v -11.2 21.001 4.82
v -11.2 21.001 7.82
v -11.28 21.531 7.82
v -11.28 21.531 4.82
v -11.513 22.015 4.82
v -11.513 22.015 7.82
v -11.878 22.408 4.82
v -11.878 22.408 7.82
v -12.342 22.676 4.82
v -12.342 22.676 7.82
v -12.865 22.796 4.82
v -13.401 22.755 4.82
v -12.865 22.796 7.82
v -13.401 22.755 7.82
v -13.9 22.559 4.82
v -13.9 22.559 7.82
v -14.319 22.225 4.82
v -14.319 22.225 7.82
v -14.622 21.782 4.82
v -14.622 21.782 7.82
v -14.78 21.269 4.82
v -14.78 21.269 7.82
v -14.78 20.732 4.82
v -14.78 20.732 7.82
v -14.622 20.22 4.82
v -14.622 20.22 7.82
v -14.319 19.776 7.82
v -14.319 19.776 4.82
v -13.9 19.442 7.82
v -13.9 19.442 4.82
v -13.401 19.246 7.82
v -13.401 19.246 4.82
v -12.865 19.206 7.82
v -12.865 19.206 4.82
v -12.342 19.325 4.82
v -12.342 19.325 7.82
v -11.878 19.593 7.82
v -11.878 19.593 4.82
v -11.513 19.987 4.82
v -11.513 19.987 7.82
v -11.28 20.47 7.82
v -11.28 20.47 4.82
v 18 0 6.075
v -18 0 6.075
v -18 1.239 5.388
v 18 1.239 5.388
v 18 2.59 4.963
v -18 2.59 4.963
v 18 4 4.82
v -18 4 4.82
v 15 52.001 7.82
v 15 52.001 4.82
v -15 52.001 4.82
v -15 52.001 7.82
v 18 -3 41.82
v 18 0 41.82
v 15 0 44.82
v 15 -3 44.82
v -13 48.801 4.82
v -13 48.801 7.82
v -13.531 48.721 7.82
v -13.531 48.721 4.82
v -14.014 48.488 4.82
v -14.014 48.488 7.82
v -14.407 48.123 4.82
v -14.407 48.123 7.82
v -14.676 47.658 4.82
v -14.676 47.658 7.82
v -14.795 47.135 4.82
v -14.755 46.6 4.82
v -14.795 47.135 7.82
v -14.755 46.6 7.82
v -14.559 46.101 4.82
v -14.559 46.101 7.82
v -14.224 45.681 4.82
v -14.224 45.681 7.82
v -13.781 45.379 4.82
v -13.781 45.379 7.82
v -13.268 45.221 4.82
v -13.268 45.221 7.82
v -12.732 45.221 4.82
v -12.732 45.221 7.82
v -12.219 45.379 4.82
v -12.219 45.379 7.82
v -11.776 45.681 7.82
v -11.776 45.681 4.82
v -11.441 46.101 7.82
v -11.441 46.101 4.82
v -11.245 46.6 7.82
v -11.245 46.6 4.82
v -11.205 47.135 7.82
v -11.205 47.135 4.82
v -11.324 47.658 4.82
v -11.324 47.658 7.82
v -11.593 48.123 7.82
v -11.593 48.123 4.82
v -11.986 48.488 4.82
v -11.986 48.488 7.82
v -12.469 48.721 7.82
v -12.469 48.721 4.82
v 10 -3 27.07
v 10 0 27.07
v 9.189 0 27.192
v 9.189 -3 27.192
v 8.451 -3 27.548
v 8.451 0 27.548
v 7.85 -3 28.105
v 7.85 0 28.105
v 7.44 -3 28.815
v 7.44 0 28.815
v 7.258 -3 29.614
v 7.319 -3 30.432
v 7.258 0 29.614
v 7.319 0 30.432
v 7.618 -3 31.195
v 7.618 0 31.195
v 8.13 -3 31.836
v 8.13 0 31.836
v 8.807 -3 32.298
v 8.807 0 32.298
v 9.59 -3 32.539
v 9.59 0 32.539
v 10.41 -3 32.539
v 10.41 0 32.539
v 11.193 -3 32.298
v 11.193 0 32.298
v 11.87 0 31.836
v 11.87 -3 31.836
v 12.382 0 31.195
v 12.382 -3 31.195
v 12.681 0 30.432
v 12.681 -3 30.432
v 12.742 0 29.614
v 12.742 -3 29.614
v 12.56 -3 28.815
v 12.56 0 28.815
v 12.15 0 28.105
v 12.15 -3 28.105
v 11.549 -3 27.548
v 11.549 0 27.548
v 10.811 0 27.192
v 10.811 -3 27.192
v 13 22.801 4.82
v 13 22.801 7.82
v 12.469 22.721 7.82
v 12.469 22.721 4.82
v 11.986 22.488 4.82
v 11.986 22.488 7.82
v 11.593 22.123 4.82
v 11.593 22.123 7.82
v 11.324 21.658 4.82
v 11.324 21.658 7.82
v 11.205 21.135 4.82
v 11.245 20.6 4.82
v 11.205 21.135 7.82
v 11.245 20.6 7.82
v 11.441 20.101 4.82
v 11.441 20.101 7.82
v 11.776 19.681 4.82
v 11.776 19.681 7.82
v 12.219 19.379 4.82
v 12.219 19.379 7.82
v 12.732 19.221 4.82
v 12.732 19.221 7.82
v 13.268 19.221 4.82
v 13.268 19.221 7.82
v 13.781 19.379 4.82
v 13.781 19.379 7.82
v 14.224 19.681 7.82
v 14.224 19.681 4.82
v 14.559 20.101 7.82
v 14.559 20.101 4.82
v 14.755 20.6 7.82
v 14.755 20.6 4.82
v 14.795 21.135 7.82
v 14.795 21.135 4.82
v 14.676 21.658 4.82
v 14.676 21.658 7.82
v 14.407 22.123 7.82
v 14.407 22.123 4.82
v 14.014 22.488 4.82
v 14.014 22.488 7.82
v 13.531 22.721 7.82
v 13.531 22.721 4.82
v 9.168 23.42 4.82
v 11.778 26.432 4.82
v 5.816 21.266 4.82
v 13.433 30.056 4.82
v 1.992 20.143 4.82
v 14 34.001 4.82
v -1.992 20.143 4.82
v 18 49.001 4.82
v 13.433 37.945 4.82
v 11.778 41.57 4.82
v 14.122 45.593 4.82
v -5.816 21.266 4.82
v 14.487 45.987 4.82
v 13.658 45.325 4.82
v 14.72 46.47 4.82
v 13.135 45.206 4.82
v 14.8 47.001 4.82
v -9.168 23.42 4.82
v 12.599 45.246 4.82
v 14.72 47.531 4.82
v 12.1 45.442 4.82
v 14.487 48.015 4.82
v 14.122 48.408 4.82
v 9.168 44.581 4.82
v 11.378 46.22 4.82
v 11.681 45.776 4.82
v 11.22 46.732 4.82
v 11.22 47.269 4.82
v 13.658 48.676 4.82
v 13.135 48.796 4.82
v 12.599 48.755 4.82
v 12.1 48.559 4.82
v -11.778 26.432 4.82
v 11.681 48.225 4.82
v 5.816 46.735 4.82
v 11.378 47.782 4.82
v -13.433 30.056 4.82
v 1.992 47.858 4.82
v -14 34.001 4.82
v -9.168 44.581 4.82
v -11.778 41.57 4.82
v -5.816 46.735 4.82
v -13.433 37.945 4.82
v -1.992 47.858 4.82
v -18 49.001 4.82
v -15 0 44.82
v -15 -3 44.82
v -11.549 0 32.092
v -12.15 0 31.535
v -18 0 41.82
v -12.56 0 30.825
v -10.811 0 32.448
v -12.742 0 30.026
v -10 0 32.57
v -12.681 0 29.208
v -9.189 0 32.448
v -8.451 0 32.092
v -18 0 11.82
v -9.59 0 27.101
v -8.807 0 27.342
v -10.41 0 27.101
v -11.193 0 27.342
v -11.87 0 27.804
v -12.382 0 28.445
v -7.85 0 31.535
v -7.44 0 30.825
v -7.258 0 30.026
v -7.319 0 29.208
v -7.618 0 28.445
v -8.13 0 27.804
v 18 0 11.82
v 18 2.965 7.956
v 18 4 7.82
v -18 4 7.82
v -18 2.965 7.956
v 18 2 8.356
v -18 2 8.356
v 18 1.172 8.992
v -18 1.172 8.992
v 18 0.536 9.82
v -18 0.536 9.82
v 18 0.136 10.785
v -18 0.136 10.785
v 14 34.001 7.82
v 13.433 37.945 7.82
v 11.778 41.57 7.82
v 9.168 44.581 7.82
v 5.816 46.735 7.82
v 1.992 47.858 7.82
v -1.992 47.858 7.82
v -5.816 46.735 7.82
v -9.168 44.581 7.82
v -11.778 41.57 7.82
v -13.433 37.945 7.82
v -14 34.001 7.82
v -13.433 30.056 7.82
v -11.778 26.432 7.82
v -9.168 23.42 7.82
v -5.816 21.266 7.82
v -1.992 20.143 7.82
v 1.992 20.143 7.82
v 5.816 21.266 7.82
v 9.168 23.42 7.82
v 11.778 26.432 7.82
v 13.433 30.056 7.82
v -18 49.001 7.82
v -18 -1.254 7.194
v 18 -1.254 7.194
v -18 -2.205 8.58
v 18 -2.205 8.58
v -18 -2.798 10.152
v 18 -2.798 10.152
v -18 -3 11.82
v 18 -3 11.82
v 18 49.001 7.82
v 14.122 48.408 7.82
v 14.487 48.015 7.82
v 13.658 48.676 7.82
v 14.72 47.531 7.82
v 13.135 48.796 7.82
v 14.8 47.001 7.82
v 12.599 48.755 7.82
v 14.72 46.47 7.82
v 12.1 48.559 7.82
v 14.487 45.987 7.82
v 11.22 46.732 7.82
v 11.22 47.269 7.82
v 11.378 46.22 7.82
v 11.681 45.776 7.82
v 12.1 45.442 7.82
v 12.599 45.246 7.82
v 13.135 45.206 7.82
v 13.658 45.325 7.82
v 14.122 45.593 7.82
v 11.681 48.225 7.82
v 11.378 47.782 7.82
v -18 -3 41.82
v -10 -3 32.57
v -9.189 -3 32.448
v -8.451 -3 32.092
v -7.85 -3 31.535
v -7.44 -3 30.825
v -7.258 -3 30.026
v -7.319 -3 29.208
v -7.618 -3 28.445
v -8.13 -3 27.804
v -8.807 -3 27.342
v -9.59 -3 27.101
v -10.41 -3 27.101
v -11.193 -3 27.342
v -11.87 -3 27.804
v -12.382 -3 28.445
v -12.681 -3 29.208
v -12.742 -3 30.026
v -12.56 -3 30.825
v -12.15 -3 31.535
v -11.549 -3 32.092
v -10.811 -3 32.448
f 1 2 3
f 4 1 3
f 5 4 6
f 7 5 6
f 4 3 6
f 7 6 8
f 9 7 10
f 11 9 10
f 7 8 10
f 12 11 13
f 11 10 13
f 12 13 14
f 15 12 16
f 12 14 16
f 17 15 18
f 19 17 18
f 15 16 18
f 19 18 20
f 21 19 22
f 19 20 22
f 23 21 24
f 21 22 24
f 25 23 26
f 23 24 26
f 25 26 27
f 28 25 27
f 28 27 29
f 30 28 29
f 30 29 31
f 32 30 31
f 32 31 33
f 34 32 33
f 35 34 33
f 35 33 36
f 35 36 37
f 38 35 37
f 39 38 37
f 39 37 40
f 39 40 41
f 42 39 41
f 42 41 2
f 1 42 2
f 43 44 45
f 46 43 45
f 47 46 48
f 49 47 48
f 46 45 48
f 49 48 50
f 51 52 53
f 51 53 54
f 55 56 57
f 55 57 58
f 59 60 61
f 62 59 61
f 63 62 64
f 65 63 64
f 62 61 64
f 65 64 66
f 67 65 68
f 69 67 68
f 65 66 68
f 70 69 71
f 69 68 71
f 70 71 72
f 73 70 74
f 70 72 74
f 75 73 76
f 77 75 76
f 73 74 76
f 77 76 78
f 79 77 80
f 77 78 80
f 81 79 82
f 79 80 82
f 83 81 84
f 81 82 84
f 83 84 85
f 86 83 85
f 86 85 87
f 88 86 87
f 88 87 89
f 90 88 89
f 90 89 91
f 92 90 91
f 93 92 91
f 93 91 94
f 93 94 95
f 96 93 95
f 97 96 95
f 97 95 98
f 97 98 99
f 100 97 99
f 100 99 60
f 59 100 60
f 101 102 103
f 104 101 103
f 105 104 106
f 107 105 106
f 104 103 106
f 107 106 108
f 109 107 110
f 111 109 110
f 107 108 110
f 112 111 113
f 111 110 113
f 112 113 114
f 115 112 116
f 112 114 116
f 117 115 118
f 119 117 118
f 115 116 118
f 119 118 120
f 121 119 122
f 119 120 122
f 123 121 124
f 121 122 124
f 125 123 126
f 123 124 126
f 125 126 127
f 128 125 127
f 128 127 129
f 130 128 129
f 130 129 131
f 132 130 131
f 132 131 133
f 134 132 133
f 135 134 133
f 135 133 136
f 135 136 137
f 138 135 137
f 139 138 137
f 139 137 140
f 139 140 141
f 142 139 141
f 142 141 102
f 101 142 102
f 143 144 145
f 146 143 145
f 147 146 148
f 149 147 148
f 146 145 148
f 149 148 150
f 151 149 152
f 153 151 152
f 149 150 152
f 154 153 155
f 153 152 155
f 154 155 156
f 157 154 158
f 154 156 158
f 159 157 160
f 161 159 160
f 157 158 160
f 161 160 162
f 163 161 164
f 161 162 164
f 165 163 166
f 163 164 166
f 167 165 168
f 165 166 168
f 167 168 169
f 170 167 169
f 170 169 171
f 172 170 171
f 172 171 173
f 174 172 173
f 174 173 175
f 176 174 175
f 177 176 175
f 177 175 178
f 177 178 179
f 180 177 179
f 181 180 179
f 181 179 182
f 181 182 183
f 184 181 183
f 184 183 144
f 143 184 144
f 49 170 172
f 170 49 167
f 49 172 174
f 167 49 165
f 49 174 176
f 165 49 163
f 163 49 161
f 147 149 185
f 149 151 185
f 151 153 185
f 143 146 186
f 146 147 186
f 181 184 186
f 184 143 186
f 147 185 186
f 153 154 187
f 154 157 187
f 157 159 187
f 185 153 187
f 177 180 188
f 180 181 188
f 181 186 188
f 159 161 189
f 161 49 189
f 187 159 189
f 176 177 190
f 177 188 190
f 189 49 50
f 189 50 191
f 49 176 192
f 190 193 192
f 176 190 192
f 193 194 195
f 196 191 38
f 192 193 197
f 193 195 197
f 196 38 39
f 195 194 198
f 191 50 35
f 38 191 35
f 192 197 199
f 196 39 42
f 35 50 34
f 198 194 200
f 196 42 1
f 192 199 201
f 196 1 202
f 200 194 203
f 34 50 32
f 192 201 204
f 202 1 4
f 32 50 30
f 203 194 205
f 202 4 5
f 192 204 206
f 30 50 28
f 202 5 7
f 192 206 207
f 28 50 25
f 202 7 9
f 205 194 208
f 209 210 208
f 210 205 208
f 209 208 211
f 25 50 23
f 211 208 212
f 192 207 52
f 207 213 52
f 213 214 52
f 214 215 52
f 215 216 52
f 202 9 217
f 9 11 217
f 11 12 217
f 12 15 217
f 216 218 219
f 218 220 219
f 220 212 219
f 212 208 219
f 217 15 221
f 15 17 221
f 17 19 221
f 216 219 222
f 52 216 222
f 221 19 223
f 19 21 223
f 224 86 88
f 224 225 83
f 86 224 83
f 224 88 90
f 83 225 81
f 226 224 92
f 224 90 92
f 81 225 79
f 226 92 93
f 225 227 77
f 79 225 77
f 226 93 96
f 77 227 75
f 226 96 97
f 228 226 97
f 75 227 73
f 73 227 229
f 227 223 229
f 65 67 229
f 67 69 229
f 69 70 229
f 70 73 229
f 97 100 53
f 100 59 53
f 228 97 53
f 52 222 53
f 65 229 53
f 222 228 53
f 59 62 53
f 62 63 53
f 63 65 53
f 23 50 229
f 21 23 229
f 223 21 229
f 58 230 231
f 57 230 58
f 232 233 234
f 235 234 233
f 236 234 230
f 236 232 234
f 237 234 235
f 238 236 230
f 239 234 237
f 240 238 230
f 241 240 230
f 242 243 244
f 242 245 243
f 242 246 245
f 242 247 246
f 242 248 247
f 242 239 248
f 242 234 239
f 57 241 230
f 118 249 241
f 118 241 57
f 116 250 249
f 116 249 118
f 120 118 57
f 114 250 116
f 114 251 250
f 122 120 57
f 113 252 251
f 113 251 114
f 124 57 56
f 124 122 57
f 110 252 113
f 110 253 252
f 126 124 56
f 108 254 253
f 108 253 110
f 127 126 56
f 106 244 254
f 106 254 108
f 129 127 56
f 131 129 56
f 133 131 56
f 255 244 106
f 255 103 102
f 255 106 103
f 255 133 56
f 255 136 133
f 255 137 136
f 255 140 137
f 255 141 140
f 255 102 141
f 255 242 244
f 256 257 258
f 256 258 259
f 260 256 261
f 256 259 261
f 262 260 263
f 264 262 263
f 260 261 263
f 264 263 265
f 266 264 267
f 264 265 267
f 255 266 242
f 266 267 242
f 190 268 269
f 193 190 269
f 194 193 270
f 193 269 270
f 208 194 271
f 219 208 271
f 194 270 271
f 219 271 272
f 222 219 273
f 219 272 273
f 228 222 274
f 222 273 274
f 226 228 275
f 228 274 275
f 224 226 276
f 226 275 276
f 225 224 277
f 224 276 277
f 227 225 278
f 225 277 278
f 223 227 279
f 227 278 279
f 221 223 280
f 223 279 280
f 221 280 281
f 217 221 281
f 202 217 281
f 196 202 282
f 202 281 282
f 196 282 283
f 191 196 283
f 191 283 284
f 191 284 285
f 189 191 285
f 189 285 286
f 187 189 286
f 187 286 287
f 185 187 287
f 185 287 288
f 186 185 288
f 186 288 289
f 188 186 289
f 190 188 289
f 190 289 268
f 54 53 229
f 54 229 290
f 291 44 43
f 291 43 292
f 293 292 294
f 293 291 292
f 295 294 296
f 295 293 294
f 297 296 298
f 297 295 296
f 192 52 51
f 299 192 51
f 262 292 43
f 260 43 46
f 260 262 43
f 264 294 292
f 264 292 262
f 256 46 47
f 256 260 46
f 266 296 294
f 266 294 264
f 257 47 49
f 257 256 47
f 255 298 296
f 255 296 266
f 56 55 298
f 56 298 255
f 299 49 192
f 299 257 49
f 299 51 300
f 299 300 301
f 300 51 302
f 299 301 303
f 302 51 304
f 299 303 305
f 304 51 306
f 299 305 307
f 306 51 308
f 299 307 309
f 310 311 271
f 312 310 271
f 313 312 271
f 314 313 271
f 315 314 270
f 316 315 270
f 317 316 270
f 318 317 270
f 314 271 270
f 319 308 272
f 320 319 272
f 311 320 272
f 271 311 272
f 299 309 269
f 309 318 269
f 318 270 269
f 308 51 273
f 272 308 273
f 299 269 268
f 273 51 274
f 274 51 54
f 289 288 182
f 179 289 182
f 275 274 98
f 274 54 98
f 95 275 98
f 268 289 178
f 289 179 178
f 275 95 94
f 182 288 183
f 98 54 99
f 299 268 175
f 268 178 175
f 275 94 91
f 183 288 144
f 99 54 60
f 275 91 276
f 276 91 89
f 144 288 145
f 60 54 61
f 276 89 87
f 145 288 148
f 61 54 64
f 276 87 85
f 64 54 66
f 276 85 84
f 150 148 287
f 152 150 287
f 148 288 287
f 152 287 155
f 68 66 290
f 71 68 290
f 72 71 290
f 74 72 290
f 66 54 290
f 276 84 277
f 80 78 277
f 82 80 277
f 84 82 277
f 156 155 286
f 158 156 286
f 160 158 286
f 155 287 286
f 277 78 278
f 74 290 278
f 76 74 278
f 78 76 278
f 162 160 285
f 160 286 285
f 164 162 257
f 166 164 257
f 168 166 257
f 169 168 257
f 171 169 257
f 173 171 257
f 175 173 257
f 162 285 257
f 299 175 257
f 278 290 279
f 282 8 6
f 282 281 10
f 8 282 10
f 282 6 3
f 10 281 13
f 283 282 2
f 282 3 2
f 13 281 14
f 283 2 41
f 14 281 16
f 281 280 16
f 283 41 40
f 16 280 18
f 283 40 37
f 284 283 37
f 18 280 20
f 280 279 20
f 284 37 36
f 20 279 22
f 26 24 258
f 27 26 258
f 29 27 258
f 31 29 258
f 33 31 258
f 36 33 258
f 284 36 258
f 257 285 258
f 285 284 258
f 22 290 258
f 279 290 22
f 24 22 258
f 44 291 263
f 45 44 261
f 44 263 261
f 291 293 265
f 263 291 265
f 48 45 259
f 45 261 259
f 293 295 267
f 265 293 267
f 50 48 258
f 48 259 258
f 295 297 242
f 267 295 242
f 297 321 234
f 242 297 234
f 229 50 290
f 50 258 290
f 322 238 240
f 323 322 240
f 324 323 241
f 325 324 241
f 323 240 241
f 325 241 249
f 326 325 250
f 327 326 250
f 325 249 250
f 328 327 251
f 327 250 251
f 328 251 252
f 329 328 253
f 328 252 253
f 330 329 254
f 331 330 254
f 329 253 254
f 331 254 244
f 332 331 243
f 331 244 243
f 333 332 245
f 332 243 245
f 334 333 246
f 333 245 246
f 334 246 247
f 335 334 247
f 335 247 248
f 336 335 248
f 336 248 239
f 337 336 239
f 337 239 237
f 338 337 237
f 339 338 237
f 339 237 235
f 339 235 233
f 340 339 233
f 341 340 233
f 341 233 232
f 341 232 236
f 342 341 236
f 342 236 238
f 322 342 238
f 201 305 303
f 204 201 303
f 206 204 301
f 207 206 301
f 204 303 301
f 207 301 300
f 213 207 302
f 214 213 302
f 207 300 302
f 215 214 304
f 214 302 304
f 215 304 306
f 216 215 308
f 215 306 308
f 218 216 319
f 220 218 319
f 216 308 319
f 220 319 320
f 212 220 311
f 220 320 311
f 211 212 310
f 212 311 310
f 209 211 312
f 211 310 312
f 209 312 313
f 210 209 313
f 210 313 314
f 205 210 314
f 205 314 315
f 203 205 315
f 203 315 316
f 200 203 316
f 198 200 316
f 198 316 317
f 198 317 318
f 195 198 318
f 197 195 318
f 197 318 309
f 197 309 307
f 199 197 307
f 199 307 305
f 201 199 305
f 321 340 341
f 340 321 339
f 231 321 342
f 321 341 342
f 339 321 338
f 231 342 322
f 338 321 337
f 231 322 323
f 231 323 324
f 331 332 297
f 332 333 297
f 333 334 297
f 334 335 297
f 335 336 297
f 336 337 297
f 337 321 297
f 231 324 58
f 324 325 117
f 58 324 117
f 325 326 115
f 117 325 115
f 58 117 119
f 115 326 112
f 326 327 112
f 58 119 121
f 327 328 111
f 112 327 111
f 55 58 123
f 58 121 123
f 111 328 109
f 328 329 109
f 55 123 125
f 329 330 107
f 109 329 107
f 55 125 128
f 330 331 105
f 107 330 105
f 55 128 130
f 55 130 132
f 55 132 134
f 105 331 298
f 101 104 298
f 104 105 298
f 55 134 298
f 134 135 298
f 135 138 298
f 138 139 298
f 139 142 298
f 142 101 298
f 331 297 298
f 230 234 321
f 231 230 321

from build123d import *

# Parameters (mm, degrees)
SKETCH_1_W             = 36
SKETCH_1_H             = 89.64
SM_BASE_FLANGE_1_DEPTH = 3
OTHER_START            = -18
OTHER_1_DEPTH          = 36
OTHER_1_2_DEPTH        = 36
SKETCH_7_R             = 14
SKETCH_7_R_2           = 1.8
CUT_EXTRUDE_1_DEPTH    = 10
CHAMFER_1_SIZE         = 3
SKETCH_8_R             = 2.75
CUT_EXTRUDE_2_DEPTH    = 10


# Read off the part's stored shape, not the designer's step: Нарисованный сгиб1
# Sheet-metal steps are written as plain solids
with BuildPart() as part:
    # Sketch 1 → Базовая кромка1 (new body)
    with BuildSketch(Plane(origin=(0, 0, 0), x_dir=(1, 0, 0), z_dir=(0, 1, 0))):
        Rectangle(SKETCH_1_W, SKETCH_1_H)
    extrude(amount=-SM_BASE_FLANGE_1_DEPTH)

    # Other 1 outline → Other 1 (cut)
    with BuildSketch(Plane.YZ.offset(OTHER_START)):
        with BuildLine():
            Line((0, -44.82), (0, 6.075437354))
            ThreePointArc((0, 6.075437354), (-2.204836823, 8.579629651), (-3, 11.82))
            Line((-3, 11.82), (-3, -44.82))
            Line((-3, -44.82), (0, -44.82))
        make_face()
    extrude(amount=OTHER_1_DEPTH, mode=Mode.SUBTRACT)

    # Other 1 2 outline → Other 1 2 (add)
    with BuildSketch(Plane.YZ.offset(OTHER_START)):
        with BuildLine():
            Line((52.000620203, 7.82), (4, 7.82))
            ThreePointArc((4, 7.82), (1.171572875, 8.991572875), (0, 11.82))
            Line((0, 11.82), (0, 6.075437354))
            ThreePointArc((0, 6.075437354), (1.903805654, 5.141229959), (4, 4.82))
            Line((4, 4.82), (52.000620203, 4.82))
            Line((52.000620203, 4.82), (52.000620203, 7.82))
        make_face()
    extrude(amount=OTHER_1_2_DEPTH)

    # Эскиз7 → Вырез-Вытянуть1 (cut)
    with BuildSketch(Plane.XY.offset(7.82)):
        with Locations((0, 34.000620203)):
            Circle(SKETCH_7_R)
        with Locations((13, 47.000620203)):
            Circle(SKETCH_7_R_2)
        with Locations(Location((-13, 47.000620203, 0), (0, 0, 90))):
            Circle(SKETCH_7_R_2)
        with Locations((-13, 21.000620203)):
            Circle(SKETCH_7_R_2)
        with Locations(Location((13, 21.000620203, 0), (0, 0, 90))):
            Circle(SKETCH_7_R_2)
    extrude(amount=-CUT_EXTRUDE_1_DEPTH, mode=Mode.SUBTRACT)

    # Фаска1
    chamfer_1_edges = [part.edges().sort_by_distance(p)[0] for p in [
        (18, -1.5, 44.82),
        (-18, -1.5, 44.82),
        (-18, 52.000620203, 6.32),
        (18, 52.000620203, 6.32),
    ]]
    chamfer(chamfer_1_edges, length=CHAMFER_1_SIZE)

    # Эскиз8 → Вырез-Вытянуть2 (cut)
    with BuildSketch(Plane(origin=(0, 0, 0), x_dir=(1, 0, 0), z_dir=(0, 1, 0))):
        with Locations(Location((-10, -29.82, 0), (0, 0, 270))):
            Circle(SKETCH_8_R)
        with Locations(Location((10, -29.82, 0), (0, 0, 90))):
            Circle(SKETCH_8_R)
    extrude(amount=-CUT_EXTRUDE_2_DEPTH, mode=Mode.SUBTRACT)


solid = part.part
